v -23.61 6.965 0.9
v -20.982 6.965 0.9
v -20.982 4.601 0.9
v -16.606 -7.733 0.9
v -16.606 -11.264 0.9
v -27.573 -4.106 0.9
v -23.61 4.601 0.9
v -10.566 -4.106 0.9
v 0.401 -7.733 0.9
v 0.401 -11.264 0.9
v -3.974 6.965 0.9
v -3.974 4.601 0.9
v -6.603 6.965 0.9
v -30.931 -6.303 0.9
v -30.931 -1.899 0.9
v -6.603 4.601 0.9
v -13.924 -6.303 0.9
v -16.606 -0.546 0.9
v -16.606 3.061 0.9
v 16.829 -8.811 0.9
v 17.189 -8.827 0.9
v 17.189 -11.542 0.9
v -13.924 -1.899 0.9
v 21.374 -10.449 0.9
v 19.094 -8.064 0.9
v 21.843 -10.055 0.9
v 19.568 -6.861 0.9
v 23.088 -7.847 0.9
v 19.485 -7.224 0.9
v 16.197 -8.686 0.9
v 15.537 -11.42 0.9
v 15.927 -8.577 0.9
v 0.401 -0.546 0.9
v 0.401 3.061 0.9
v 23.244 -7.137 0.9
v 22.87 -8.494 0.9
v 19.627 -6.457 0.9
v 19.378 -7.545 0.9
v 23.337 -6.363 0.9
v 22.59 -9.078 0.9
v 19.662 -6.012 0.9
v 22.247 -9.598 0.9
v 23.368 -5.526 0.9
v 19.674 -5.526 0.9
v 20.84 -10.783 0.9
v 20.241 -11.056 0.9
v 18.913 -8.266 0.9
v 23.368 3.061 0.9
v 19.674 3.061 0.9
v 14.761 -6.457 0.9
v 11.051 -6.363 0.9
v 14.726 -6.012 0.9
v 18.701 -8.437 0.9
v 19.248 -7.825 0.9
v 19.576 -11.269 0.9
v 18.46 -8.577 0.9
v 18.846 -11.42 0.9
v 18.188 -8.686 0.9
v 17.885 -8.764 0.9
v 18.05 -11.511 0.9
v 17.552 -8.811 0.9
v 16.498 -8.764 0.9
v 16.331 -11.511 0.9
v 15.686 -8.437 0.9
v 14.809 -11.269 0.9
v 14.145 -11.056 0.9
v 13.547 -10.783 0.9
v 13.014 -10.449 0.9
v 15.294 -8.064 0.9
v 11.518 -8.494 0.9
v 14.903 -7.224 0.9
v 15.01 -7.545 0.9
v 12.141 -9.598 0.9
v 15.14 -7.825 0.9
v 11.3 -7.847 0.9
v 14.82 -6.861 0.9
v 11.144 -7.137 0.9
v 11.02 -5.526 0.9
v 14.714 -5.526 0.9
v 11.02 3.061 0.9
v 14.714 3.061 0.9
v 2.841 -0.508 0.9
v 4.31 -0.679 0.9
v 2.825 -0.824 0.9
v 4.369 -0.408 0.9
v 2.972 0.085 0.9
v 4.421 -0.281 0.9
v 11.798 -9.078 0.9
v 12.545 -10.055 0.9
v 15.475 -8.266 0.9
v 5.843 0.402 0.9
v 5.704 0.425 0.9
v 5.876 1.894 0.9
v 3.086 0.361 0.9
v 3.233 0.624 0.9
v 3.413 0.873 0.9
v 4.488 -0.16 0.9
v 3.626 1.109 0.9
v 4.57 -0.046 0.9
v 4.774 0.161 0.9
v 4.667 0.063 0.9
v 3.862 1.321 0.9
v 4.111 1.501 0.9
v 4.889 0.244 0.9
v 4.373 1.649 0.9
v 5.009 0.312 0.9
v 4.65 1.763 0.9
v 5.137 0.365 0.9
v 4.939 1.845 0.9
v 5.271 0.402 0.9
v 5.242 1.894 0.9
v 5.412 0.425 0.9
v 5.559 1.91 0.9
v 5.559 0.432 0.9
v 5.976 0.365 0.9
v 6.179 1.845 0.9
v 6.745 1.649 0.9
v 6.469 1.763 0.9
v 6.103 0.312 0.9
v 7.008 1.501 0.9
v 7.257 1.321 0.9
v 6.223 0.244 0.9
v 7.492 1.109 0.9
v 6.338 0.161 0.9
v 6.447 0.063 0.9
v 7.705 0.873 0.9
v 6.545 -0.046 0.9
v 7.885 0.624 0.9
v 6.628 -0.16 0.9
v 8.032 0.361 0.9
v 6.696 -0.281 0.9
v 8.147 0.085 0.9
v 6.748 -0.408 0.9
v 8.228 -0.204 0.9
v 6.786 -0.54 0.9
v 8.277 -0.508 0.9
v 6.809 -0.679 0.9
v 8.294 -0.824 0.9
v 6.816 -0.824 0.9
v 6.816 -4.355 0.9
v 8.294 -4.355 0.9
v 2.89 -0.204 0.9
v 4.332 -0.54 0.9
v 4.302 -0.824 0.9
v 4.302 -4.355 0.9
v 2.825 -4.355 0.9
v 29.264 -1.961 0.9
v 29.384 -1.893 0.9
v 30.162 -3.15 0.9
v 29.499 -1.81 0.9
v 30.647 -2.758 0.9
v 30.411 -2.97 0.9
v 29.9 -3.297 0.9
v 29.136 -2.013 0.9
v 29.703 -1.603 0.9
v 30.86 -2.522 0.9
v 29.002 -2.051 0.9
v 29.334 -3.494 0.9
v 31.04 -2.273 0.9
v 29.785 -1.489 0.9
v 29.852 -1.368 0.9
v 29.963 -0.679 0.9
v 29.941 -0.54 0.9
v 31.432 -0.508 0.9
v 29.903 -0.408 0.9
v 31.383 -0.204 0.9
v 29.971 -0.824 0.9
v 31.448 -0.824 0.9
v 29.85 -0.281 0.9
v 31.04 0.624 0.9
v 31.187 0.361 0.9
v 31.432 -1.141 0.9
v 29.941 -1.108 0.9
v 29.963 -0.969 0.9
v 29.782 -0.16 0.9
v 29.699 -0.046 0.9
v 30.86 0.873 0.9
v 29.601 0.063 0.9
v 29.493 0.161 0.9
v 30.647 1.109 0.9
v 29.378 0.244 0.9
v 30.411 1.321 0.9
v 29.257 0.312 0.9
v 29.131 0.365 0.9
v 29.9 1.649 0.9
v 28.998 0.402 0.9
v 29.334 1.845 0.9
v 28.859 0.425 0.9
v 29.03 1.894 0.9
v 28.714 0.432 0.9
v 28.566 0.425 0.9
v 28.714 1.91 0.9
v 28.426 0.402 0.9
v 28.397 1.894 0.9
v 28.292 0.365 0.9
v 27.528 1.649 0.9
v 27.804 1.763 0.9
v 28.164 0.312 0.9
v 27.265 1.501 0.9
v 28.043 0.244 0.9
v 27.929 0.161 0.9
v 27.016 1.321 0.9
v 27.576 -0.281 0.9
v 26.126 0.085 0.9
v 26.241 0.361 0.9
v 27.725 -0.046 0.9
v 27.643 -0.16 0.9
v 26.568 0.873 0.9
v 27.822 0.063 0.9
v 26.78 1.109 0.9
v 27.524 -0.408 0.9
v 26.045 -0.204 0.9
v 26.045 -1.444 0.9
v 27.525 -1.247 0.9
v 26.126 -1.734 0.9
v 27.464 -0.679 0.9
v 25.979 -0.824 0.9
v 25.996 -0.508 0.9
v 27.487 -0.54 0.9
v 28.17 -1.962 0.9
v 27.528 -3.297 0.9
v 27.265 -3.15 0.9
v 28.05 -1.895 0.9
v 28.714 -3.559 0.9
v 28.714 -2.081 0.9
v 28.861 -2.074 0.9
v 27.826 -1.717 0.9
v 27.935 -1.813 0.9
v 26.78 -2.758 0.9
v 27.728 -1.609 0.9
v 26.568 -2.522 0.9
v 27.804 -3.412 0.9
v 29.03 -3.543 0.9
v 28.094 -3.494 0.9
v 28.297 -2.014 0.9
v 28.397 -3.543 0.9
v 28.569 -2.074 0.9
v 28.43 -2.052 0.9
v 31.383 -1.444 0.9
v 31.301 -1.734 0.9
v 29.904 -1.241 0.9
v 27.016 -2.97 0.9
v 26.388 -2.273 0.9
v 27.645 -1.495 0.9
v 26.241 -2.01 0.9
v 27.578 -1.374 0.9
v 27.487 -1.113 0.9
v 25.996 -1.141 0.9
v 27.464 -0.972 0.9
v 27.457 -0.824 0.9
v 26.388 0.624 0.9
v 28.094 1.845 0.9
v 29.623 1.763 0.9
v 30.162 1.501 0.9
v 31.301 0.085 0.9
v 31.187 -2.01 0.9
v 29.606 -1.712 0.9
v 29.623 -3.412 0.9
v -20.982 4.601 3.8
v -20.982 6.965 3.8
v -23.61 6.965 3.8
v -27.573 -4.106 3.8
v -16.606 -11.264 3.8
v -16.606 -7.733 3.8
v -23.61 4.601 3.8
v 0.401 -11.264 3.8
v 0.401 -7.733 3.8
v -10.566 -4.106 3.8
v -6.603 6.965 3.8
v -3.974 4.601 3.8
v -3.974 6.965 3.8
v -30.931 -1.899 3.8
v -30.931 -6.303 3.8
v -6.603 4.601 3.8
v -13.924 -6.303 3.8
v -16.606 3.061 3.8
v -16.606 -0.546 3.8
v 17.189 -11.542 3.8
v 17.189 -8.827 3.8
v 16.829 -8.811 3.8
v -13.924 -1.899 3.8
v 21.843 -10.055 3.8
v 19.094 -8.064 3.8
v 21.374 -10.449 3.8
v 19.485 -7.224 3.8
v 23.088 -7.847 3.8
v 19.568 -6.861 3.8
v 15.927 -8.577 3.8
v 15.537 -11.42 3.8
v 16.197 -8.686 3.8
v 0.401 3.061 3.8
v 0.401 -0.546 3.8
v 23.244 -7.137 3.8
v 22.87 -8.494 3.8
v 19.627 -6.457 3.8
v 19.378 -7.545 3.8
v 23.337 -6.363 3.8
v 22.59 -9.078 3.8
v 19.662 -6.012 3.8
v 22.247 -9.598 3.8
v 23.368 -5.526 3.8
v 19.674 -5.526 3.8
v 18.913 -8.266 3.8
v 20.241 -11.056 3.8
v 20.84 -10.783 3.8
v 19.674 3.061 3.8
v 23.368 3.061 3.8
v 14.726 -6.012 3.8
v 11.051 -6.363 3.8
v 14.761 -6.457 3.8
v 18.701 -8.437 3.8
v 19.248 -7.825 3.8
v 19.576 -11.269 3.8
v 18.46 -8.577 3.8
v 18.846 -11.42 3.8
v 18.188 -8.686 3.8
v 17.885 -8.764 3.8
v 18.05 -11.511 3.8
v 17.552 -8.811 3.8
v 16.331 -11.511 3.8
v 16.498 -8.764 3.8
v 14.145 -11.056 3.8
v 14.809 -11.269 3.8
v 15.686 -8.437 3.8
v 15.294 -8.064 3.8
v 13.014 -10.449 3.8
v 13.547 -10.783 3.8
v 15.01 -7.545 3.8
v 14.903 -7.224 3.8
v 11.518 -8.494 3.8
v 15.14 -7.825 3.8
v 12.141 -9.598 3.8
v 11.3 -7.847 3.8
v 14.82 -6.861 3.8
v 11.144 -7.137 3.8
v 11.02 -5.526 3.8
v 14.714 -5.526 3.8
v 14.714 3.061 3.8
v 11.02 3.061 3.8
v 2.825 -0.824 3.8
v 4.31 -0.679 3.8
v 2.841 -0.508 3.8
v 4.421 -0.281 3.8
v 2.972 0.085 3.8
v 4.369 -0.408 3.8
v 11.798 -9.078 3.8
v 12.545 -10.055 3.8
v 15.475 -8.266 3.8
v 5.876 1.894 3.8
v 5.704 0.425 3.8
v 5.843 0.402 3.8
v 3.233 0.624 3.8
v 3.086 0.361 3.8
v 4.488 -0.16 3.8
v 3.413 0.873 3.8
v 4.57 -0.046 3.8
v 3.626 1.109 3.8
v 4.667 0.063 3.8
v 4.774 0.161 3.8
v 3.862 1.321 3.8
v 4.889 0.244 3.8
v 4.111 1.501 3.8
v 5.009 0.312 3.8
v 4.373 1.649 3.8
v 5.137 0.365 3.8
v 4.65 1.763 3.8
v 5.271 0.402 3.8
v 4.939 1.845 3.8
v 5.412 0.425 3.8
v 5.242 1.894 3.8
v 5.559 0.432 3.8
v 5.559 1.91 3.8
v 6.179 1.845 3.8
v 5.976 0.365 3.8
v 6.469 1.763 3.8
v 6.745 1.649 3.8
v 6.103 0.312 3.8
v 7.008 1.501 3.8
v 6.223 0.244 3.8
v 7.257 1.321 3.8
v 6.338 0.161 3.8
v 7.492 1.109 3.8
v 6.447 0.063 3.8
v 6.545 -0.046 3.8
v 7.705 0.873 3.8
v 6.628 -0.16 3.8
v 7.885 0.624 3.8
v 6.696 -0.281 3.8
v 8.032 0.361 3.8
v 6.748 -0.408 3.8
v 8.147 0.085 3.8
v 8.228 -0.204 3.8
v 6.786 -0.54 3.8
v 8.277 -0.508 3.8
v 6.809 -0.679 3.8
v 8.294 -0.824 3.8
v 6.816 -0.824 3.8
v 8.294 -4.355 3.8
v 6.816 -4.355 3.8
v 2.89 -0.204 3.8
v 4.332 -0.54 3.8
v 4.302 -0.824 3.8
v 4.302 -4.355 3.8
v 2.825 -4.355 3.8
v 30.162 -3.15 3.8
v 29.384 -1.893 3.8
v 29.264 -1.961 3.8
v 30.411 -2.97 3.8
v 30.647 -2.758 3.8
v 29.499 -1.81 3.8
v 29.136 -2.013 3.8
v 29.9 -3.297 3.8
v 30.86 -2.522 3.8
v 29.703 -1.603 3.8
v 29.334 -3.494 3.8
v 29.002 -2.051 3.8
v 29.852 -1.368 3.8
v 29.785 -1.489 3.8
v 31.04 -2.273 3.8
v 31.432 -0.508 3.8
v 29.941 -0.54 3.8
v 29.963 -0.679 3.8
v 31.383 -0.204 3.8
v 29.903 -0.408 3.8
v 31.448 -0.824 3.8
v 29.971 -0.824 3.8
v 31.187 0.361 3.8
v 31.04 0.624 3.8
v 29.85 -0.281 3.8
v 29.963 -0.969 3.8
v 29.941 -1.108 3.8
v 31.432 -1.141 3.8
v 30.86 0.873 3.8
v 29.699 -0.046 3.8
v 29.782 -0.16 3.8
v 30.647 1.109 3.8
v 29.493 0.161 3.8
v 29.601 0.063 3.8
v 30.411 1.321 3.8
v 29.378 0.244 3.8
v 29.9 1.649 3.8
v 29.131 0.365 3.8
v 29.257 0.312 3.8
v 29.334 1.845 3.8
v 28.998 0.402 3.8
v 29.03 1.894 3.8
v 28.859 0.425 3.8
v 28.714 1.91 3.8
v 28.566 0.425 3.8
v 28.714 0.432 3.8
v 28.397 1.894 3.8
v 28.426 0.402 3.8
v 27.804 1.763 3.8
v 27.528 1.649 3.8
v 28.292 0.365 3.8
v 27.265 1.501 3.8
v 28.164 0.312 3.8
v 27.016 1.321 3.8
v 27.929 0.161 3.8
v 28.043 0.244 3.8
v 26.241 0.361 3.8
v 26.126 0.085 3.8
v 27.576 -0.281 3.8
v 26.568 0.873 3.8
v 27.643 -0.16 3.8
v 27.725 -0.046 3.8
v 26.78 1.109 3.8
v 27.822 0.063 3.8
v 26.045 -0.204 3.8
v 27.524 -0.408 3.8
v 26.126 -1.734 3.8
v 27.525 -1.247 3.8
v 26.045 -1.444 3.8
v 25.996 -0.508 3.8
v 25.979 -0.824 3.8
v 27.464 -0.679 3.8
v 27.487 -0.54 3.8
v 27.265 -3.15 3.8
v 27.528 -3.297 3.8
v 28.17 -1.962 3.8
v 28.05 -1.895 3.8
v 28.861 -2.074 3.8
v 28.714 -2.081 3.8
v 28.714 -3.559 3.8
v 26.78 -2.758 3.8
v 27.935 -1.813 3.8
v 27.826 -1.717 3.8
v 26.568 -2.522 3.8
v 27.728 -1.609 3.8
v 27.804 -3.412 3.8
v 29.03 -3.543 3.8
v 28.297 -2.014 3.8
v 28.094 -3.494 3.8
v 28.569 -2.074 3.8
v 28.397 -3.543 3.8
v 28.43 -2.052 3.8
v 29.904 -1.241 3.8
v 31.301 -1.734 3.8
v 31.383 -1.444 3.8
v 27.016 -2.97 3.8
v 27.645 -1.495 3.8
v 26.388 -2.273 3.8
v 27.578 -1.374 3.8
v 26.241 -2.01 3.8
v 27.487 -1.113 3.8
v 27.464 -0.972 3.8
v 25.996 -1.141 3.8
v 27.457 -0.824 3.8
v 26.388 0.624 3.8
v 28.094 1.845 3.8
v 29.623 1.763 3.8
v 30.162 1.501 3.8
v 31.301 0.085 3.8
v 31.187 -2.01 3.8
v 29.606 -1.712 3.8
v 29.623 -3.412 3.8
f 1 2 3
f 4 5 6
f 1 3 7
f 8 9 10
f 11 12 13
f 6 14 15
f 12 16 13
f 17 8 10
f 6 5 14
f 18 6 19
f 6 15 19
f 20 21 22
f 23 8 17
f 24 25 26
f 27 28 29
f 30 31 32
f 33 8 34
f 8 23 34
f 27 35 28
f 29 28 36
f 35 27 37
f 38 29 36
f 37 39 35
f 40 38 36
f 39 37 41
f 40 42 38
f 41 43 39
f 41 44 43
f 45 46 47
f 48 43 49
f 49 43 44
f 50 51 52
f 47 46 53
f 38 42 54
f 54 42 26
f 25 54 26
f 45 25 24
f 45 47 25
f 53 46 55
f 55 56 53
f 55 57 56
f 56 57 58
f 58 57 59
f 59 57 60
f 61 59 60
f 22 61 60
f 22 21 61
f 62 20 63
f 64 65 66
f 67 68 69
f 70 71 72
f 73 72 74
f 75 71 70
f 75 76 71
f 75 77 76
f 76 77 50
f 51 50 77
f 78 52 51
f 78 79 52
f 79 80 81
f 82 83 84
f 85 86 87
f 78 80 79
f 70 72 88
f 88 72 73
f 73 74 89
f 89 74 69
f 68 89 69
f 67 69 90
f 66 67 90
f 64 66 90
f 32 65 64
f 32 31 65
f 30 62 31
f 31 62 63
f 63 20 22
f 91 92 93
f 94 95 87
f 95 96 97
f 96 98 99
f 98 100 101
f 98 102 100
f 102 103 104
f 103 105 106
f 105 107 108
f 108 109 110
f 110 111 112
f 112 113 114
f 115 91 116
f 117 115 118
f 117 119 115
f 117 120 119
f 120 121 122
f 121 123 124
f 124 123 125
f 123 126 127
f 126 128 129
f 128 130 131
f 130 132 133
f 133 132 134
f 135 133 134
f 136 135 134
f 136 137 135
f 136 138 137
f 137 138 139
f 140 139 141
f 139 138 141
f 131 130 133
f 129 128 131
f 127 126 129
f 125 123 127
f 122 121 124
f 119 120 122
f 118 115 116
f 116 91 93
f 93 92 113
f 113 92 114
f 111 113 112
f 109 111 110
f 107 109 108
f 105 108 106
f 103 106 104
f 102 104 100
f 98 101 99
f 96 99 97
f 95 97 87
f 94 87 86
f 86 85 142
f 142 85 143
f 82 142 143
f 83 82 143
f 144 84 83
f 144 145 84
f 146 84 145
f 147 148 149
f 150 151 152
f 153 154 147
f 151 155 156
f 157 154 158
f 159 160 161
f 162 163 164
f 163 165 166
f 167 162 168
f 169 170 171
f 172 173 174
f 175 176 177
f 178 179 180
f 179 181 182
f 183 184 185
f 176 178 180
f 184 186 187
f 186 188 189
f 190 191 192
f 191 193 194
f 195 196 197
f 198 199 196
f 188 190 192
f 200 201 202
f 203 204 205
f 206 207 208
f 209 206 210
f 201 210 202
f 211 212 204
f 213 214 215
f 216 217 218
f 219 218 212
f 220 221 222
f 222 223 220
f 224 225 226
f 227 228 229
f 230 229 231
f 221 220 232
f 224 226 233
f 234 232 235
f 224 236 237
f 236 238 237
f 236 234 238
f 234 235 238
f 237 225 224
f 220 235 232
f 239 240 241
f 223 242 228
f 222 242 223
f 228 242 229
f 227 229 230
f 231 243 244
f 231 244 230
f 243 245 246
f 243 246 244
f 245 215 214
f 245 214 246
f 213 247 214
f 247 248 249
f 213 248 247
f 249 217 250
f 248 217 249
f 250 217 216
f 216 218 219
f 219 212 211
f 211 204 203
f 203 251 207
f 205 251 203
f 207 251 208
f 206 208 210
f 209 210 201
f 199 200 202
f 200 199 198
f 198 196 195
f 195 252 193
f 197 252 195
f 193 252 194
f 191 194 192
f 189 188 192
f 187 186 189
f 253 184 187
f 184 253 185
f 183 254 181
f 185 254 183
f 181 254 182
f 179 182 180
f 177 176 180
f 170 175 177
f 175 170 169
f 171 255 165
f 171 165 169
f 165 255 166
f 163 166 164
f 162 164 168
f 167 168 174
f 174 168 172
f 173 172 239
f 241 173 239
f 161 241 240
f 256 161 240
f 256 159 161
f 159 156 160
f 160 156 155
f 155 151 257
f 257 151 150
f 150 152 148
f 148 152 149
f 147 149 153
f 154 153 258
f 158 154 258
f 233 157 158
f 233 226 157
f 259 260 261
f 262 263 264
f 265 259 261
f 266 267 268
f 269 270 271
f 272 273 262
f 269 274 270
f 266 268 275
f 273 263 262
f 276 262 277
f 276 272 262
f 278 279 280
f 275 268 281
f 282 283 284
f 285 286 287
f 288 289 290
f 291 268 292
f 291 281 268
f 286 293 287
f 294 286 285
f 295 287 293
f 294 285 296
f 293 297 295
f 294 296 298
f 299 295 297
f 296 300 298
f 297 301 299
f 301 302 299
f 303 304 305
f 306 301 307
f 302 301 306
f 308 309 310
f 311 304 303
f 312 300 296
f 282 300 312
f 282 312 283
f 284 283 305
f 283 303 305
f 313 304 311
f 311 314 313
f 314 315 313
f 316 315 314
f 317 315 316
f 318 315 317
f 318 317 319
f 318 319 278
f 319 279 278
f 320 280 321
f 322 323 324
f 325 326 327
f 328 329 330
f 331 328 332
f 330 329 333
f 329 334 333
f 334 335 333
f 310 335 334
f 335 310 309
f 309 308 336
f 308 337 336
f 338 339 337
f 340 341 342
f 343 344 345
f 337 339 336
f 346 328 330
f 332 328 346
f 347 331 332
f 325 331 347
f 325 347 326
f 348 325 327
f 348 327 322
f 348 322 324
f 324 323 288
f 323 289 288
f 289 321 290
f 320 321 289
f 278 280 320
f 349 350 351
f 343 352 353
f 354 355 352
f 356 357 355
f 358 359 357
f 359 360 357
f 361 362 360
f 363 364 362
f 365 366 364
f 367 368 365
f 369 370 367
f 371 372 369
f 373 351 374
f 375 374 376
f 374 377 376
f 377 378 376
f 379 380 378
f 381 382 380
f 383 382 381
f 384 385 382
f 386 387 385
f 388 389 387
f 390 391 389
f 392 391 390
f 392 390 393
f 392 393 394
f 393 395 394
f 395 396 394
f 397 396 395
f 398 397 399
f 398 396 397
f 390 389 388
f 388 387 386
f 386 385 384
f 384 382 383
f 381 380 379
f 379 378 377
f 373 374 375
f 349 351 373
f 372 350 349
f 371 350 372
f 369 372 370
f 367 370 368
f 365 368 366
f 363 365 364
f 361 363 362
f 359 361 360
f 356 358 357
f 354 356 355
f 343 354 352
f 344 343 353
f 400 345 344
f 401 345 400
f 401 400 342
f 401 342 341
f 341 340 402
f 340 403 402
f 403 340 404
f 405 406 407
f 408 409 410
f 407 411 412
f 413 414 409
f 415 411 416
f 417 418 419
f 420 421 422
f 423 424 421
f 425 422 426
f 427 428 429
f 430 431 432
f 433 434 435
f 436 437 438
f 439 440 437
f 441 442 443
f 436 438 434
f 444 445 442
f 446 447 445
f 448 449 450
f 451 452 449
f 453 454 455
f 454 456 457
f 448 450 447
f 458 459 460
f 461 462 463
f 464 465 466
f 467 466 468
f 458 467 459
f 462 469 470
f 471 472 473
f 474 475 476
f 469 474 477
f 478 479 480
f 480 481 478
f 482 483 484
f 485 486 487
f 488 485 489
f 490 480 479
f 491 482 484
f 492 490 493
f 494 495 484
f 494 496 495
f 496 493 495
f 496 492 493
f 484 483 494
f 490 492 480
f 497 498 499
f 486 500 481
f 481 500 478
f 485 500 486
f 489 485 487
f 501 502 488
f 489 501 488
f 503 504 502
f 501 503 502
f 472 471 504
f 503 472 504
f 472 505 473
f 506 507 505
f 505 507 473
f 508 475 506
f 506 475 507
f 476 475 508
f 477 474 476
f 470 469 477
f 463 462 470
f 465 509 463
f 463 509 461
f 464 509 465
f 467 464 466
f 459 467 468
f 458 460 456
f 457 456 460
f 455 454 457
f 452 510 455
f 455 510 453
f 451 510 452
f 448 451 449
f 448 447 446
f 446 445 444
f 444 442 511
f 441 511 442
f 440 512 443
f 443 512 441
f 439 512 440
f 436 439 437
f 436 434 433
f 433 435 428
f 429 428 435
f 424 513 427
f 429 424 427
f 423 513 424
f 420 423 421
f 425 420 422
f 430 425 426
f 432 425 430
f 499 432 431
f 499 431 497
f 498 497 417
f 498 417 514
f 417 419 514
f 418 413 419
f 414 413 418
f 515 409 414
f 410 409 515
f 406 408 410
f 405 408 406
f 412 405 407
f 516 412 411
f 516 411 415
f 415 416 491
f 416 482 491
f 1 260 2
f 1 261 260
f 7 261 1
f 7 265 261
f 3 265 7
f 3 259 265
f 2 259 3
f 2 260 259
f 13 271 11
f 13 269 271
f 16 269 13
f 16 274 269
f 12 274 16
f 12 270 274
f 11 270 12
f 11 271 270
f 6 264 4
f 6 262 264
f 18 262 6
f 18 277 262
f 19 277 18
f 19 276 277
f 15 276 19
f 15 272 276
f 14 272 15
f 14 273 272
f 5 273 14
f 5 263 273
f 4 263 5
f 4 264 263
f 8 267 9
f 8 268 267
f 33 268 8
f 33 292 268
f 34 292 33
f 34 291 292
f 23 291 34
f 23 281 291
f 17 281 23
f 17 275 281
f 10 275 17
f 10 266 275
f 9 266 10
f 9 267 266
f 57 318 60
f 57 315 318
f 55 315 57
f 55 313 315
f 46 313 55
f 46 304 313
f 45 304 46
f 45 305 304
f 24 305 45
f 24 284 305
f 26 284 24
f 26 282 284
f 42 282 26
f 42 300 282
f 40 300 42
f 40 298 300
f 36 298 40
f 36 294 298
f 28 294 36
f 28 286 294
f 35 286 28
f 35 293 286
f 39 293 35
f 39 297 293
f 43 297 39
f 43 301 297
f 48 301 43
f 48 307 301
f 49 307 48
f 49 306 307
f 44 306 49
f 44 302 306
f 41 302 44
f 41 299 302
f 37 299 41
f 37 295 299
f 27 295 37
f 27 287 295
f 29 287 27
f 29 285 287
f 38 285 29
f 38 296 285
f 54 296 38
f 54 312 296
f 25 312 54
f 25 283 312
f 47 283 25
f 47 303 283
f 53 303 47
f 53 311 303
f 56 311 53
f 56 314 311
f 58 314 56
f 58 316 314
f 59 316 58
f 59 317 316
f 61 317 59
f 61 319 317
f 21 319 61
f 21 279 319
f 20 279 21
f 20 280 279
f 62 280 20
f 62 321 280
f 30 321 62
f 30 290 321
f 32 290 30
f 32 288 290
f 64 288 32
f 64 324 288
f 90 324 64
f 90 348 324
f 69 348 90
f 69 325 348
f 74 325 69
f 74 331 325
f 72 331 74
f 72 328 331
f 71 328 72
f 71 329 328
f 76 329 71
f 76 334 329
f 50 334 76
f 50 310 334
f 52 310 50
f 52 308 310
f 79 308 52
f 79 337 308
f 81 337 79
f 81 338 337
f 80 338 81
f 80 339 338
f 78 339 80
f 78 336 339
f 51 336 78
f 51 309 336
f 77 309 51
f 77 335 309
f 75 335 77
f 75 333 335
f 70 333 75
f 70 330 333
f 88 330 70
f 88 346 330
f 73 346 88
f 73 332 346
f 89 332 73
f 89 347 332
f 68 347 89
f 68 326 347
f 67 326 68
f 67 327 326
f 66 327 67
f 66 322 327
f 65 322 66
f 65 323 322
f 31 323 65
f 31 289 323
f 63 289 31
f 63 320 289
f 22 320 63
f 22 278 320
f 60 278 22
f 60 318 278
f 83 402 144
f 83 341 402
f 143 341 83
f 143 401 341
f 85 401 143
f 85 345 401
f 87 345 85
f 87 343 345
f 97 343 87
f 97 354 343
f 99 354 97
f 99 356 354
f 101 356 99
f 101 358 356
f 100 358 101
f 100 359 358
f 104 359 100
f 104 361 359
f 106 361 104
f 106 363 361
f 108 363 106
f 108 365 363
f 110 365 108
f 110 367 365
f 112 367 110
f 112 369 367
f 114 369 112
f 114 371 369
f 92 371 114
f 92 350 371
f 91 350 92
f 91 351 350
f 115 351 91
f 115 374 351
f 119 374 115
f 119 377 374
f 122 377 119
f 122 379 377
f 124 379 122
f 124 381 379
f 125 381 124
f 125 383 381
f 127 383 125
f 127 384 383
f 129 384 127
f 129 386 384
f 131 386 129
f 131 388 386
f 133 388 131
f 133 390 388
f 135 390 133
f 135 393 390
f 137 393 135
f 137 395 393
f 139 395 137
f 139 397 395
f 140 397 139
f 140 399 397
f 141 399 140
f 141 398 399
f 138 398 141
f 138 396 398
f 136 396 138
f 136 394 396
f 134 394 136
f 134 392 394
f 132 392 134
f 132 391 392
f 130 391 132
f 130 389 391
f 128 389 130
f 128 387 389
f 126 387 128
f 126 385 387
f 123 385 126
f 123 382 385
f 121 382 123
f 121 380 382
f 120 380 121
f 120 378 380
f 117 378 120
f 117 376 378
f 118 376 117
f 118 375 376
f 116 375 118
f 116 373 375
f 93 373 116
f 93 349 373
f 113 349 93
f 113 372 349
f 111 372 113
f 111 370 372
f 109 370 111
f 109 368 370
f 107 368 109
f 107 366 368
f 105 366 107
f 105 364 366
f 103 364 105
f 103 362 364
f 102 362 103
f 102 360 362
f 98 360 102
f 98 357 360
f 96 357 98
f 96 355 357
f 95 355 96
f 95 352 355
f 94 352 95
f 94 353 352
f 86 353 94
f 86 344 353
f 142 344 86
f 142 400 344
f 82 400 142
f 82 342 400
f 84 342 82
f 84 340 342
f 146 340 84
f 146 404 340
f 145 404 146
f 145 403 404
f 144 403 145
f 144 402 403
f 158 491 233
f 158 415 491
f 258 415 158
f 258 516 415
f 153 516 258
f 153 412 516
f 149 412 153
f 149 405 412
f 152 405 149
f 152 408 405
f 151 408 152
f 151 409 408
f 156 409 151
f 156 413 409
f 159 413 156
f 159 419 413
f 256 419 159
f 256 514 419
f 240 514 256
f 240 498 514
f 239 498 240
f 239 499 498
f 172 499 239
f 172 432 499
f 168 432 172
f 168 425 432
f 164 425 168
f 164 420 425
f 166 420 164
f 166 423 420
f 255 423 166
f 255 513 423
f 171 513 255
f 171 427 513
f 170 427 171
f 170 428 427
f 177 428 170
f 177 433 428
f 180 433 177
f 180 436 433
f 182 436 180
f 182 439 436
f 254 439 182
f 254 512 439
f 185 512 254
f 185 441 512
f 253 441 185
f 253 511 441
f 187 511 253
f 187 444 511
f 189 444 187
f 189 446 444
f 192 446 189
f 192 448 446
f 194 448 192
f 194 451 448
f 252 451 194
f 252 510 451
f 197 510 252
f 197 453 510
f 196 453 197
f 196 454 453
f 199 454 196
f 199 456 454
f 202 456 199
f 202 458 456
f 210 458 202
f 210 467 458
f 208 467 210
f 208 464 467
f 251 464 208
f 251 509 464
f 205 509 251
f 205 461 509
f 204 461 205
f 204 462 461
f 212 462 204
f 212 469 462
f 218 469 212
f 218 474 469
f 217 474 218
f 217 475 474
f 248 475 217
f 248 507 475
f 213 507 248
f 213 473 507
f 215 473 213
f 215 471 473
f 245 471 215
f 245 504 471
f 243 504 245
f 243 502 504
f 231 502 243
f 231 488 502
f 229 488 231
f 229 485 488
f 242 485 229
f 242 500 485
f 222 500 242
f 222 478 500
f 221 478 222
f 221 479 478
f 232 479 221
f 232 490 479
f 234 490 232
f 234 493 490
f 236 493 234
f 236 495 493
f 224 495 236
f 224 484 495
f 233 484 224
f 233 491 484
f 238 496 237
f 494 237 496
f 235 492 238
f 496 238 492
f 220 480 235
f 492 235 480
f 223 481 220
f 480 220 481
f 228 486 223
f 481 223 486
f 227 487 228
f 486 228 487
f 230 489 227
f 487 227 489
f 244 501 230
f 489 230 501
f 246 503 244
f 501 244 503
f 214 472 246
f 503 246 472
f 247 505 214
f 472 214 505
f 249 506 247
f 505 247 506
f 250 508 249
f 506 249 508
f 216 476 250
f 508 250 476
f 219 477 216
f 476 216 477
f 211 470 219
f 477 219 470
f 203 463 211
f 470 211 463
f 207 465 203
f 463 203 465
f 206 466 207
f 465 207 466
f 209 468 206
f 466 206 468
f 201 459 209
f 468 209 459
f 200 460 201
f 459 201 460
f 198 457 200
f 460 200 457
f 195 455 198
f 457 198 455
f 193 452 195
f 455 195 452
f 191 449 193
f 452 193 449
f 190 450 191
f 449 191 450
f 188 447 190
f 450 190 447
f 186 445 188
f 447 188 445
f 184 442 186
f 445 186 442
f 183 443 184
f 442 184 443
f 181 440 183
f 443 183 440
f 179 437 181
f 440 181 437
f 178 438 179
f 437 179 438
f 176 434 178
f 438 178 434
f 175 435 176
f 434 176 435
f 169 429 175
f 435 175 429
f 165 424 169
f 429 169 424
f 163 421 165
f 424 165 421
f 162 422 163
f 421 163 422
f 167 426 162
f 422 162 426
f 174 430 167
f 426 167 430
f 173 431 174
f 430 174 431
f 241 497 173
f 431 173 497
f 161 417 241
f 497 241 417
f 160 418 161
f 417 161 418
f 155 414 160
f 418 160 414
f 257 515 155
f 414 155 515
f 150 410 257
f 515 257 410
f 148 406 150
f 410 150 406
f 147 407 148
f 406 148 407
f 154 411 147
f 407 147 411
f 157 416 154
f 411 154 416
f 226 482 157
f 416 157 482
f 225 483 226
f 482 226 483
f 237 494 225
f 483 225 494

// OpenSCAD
$fn = 48;
  // syllabics (overlaid on icon, tallest)
  translate([0, -2.500, 0.900]) linear_extrude(height=2.900) text("ᐹᐹᐢᑌᐤ", size=14.149, halign="center", valign="center", font="Euphemia UCAS:style=Bold");
